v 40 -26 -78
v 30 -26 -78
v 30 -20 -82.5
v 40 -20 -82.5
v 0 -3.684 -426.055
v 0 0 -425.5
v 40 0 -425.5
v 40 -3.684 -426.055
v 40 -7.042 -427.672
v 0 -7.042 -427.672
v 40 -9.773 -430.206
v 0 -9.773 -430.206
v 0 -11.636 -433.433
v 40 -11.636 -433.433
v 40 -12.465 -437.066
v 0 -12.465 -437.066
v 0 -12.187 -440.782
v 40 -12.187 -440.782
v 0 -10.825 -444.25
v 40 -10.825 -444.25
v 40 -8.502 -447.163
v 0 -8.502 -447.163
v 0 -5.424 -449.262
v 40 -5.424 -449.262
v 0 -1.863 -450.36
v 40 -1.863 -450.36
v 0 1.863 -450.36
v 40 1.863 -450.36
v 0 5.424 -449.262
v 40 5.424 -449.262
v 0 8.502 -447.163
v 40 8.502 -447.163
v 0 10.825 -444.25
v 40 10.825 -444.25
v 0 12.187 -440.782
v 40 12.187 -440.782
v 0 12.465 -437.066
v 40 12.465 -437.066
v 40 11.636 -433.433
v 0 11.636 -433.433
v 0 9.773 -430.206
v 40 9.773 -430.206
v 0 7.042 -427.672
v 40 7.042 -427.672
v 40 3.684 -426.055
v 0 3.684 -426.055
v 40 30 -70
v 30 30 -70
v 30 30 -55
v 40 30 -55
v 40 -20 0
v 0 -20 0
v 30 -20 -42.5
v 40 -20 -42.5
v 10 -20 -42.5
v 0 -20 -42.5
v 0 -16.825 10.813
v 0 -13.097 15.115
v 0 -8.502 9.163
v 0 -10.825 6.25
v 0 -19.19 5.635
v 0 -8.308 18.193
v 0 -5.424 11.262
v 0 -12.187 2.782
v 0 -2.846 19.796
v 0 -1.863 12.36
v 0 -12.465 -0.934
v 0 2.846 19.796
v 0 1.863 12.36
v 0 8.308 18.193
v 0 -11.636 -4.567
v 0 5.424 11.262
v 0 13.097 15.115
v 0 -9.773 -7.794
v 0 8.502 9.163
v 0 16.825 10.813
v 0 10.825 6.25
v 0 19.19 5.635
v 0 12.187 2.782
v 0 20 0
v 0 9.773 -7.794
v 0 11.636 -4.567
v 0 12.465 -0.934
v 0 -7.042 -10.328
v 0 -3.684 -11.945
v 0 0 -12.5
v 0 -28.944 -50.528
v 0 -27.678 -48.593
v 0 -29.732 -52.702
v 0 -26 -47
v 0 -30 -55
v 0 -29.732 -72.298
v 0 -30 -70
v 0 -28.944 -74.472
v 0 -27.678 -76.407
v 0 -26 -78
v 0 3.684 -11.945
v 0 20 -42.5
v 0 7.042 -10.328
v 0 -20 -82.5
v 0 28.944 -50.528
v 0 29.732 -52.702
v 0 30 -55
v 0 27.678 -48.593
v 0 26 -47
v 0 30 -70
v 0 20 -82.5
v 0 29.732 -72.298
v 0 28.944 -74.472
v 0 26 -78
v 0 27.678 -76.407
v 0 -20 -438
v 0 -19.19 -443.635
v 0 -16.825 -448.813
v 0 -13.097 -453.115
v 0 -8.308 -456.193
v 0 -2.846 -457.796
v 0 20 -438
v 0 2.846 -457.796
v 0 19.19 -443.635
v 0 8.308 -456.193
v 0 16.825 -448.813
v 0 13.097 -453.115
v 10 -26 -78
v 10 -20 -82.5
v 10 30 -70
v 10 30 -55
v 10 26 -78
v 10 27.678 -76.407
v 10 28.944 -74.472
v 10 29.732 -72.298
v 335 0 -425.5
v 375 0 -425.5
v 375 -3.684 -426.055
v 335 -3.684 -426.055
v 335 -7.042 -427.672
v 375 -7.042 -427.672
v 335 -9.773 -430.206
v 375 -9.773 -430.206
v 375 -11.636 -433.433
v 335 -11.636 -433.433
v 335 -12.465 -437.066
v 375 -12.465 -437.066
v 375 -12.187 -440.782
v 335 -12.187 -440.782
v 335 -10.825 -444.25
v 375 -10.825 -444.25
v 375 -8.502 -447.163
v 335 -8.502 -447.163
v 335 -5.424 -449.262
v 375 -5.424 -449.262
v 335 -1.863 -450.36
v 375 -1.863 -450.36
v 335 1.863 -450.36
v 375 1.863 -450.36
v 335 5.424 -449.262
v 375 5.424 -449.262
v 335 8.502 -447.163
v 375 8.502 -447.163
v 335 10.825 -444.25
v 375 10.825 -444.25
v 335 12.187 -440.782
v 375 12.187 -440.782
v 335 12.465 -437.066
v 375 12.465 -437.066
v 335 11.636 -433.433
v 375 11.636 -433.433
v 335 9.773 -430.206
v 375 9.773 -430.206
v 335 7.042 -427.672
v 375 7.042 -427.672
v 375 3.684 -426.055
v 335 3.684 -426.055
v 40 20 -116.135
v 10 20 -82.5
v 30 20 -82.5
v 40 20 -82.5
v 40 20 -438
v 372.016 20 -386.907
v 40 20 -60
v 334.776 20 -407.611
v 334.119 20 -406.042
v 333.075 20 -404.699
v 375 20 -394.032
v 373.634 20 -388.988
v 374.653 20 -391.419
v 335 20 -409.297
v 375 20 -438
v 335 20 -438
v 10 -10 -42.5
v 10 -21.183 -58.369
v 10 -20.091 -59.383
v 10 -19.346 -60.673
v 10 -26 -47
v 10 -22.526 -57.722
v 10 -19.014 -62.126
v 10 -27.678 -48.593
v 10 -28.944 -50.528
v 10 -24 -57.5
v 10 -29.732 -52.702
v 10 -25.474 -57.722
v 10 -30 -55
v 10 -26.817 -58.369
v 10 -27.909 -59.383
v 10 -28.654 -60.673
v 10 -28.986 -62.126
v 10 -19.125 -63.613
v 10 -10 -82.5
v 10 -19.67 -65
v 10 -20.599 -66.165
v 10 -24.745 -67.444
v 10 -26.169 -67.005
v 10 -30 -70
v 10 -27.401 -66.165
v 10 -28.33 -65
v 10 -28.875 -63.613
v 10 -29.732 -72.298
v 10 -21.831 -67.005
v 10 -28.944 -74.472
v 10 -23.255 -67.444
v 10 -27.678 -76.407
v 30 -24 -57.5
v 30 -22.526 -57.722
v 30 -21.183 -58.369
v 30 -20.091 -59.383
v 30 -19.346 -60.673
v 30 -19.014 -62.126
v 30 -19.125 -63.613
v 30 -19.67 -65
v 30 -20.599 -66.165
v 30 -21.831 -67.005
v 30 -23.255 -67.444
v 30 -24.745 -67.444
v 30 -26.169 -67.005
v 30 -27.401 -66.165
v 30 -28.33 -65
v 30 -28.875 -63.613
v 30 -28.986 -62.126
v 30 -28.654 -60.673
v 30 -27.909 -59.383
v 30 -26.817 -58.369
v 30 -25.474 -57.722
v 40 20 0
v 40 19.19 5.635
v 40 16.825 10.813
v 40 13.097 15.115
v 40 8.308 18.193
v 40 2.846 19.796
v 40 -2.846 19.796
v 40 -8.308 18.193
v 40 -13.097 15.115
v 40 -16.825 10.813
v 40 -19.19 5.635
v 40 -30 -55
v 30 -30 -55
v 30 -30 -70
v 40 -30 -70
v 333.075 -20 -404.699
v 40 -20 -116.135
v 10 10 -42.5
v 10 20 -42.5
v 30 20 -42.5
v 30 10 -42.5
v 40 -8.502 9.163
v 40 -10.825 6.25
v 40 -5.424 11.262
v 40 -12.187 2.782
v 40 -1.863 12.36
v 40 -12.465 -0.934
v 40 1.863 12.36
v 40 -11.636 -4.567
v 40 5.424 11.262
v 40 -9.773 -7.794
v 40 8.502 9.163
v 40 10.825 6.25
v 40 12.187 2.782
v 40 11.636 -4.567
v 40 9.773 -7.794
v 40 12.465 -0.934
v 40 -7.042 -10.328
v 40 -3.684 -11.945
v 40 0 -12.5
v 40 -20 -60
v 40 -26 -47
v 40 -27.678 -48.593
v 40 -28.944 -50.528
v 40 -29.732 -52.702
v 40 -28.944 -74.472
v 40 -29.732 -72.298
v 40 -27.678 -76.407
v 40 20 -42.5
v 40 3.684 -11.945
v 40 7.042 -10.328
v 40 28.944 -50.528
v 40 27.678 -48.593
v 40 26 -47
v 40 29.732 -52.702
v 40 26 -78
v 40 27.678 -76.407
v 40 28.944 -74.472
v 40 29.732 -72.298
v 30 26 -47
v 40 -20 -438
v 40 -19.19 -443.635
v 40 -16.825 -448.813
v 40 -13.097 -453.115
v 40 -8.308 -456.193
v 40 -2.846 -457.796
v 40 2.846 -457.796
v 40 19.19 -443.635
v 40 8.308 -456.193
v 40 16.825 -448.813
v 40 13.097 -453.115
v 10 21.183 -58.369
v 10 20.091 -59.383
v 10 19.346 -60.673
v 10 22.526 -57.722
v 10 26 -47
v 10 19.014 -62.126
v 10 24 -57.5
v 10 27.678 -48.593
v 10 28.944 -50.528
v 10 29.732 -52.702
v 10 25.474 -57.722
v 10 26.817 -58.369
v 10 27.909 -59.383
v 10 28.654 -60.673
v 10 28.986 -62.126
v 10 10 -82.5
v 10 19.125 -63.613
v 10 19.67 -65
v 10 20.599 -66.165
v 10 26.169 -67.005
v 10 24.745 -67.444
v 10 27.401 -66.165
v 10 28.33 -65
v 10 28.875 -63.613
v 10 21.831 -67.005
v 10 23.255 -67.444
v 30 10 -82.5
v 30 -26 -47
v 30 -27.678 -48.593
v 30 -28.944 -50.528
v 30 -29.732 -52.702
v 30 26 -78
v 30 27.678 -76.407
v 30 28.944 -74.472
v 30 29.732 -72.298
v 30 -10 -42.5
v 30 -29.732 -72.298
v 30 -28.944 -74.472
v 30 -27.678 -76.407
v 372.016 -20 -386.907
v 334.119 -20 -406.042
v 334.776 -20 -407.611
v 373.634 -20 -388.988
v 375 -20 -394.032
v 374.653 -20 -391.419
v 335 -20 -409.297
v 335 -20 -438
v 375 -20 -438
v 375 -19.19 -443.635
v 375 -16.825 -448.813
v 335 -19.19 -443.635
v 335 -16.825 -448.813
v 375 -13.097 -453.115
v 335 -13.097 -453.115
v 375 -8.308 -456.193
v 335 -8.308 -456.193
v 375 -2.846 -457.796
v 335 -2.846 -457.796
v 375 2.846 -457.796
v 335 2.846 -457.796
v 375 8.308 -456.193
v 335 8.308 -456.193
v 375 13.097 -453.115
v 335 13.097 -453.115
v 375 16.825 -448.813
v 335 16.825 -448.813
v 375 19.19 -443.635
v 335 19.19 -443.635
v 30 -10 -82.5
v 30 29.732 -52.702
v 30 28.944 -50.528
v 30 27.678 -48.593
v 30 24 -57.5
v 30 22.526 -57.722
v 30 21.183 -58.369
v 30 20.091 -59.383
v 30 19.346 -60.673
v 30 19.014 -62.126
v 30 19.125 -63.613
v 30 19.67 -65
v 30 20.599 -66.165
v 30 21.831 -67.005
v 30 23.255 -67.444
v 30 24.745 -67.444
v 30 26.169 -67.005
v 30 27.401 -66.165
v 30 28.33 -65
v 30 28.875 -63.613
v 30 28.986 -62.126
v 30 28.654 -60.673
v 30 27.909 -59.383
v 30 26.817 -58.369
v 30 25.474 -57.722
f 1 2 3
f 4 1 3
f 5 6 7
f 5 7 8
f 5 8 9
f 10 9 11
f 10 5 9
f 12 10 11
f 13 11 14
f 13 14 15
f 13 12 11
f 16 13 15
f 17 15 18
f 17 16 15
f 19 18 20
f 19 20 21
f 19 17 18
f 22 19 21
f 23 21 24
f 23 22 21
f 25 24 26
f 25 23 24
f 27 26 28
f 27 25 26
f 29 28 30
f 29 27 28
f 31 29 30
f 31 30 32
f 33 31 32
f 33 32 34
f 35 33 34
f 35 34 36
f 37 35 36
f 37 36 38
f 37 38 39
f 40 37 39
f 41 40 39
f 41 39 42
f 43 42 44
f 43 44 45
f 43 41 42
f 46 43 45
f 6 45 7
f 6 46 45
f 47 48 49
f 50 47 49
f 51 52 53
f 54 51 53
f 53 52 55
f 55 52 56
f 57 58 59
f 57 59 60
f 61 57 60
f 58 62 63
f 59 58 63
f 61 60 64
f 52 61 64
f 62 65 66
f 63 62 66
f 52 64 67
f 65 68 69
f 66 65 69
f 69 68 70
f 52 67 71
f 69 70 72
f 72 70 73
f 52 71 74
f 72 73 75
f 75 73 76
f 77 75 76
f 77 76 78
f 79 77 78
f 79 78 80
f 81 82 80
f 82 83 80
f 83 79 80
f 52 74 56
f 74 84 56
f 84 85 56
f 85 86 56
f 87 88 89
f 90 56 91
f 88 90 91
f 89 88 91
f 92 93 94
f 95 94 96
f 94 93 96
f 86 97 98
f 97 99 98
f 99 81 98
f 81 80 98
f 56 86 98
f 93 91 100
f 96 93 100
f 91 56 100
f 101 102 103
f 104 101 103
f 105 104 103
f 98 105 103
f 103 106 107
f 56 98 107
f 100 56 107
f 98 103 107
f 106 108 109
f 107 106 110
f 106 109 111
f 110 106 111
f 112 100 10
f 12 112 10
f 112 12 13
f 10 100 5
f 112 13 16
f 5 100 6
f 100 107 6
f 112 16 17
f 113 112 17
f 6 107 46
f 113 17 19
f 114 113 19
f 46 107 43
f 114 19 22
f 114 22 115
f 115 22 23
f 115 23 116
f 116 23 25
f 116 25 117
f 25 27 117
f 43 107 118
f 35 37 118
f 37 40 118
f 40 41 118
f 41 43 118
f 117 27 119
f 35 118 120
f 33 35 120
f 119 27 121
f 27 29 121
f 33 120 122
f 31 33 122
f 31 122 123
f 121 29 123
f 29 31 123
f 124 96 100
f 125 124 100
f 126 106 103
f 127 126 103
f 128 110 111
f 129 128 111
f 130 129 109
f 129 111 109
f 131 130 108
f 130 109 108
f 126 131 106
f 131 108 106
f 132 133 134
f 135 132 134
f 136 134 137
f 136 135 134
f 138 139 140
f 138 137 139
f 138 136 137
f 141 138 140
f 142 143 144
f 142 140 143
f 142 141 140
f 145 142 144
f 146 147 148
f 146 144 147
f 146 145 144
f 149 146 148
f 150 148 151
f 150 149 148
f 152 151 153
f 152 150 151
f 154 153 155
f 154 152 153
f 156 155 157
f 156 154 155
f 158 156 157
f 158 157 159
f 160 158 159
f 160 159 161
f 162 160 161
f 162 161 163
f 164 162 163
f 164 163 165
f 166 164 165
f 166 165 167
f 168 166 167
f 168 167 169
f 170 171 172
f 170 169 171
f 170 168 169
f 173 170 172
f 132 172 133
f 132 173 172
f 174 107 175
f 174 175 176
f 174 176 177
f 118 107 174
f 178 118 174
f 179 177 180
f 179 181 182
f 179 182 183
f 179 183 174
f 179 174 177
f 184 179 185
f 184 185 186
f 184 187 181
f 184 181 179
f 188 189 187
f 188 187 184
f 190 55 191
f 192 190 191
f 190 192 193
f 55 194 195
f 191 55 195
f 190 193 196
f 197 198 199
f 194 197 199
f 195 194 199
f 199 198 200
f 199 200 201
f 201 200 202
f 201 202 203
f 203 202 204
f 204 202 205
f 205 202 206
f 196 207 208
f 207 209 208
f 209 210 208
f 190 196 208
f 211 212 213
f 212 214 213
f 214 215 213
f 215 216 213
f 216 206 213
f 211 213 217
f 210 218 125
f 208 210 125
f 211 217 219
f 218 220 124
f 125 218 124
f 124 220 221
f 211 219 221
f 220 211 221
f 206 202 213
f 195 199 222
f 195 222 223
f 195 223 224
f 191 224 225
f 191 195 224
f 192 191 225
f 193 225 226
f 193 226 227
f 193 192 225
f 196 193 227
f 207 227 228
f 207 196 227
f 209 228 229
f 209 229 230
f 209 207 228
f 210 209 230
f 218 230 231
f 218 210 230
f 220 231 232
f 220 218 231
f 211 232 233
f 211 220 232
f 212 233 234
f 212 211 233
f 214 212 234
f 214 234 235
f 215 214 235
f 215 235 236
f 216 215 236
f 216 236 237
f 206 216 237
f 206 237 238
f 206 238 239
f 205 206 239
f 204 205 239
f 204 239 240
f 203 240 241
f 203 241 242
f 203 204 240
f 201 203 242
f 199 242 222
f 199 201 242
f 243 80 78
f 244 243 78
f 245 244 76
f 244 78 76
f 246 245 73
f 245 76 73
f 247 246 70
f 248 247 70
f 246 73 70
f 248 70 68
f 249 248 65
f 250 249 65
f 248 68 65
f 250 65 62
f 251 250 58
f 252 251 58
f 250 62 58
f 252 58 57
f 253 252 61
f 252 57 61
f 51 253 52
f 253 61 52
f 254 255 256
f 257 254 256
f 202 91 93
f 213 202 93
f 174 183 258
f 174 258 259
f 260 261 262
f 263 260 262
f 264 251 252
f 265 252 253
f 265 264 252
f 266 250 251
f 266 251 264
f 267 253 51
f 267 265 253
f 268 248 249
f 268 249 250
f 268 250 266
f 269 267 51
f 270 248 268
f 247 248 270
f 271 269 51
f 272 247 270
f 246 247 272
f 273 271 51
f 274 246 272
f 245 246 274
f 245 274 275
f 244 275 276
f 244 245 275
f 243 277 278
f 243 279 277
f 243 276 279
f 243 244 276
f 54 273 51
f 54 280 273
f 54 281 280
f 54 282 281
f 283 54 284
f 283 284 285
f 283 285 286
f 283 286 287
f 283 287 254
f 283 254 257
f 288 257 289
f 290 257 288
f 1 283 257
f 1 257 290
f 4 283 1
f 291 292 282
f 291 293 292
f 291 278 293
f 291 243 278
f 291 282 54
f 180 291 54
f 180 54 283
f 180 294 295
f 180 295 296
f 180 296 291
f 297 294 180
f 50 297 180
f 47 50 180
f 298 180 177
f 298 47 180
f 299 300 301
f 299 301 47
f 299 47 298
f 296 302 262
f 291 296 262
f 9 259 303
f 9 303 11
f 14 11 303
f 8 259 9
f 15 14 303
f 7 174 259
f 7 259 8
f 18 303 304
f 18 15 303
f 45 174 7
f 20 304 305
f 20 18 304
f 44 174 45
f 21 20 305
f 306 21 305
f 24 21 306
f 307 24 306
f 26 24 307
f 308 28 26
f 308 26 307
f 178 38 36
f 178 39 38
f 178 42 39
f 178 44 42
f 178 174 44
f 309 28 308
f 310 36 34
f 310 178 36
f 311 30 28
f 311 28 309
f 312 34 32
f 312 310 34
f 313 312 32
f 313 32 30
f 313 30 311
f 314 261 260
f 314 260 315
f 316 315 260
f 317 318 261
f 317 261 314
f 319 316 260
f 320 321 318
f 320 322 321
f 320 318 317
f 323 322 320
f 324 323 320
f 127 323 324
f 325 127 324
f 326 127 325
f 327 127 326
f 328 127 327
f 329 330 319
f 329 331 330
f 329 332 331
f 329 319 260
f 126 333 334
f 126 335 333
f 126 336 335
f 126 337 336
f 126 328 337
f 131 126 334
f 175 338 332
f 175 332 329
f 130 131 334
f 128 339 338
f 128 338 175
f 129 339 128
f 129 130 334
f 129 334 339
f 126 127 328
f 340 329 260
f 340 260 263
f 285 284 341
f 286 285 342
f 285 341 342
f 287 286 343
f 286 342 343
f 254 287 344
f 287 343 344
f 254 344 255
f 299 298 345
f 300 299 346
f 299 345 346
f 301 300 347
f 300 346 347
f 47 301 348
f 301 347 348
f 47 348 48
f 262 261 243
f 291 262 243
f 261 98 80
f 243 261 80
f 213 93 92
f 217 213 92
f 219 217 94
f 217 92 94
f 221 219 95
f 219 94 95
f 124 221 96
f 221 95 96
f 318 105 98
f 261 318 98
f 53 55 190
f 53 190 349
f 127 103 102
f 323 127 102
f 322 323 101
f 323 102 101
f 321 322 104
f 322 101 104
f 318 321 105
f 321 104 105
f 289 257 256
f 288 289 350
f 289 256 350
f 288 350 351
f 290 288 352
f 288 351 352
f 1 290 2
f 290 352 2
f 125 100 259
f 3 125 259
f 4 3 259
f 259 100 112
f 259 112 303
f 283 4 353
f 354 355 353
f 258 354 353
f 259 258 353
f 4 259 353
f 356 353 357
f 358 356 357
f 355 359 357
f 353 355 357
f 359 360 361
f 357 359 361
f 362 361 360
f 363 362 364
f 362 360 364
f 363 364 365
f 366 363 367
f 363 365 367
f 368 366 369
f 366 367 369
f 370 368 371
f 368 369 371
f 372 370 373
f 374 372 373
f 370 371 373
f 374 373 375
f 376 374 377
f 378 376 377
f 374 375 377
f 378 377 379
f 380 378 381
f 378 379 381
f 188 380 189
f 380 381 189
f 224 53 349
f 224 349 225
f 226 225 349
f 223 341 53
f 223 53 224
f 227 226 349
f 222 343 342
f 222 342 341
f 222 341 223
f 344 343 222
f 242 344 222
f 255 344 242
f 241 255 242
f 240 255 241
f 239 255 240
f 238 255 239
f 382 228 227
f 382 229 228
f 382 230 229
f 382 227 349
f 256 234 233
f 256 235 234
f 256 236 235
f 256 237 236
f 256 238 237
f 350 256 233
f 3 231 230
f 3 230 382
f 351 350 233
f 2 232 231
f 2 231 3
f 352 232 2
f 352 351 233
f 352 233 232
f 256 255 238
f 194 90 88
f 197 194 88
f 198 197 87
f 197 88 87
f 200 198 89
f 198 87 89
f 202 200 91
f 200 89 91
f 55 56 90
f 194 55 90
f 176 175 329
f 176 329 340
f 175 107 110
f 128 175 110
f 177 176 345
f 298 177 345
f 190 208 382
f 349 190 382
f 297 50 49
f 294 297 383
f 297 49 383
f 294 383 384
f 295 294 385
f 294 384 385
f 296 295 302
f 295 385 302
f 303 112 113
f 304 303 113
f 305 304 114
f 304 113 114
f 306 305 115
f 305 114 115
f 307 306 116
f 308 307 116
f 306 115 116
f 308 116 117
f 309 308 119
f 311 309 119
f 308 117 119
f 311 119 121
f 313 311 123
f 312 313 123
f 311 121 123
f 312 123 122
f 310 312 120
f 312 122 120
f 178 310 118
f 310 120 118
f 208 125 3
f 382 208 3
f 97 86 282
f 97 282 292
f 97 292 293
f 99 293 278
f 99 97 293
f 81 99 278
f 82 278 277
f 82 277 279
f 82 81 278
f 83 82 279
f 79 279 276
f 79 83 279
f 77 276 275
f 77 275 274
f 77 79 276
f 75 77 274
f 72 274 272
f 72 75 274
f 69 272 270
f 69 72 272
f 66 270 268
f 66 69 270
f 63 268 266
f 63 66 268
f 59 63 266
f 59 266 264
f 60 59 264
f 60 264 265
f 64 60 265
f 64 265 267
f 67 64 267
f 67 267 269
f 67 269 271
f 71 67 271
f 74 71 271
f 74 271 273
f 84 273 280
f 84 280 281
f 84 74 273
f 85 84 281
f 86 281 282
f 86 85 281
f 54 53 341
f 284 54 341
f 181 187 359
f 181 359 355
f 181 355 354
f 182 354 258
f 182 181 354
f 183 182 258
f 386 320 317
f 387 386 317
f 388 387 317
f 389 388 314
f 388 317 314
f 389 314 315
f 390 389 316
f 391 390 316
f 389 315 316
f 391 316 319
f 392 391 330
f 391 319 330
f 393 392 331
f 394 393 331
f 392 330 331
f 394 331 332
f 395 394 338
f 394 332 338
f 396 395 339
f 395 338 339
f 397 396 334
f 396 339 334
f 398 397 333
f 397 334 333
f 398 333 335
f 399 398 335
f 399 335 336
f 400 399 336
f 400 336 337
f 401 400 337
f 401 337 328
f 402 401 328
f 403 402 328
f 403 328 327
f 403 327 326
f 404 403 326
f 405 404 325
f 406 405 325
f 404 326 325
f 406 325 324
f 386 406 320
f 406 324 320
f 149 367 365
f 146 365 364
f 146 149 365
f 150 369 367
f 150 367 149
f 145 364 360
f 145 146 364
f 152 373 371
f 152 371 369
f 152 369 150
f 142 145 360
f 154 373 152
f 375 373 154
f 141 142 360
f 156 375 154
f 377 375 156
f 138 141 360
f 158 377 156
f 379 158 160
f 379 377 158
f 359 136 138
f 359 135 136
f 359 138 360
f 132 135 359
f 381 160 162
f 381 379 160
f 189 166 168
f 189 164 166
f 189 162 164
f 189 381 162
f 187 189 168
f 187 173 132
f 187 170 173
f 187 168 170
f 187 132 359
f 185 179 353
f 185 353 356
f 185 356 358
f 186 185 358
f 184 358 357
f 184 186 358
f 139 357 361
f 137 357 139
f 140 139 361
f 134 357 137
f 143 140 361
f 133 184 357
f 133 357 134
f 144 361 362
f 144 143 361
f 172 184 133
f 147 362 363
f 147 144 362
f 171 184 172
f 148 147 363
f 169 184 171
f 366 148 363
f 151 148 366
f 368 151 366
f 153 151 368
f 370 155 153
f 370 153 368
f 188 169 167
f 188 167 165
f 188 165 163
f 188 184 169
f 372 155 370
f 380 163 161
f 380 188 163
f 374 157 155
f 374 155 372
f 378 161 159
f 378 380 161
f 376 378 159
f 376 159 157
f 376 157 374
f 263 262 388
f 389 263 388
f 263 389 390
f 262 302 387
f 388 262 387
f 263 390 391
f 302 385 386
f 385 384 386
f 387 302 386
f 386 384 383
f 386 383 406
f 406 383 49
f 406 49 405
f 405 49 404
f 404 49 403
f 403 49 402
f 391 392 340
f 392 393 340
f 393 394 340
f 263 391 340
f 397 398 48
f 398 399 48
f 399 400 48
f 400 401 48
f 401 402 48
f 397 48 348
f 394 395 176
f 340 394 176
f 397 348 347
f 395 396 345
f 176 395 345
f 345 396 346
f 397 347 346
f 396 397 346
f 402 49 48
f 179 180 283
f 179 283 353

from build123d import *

# Parameters (mm, degrees)
CROQUIS1_R                 = 12.5
SALIENTE_EXTRUIR1_DEPTH    = 40
SALIENTE_EXTRUIR2_DEPTH    = 40
CORTAR_EXTRUIR2_DEPTH      = 45
CORTAR_EXTRUIR2_DEPTH_BACK = 45
CROQUIS4_R                 = 12.5
CROQUIS6_W                 = 20
CROQUIS6_H                 = 40
CORTAR_EXTRUIR3_DEPTH      = 20
CROQUIS7_R                 = 5
SALIENTE_EXTRUIR3_DEPTH    = 20


with BuildPart() as part:
    # Croquis1 → Saliente-Extruir1 (new body)
    with BuildSketch(Plane(origin=(0, 0, 0), x_dir=(0, 0, -1), z_dir=(1, 0, 0))):
        with BuildLine():
            Line((42.5, 20), (0, 20))
            ThreePointArc((0, 20), (-20, 0), (0, -20))
            Line((0, -20), (42.5, -20))
            Line((42.5, -20), (47, -26))
            ThreePointArc((47, -26), (50.527864045, -28.94427191), (55, -30))
            Line((55, -30), (70, -30))
            ThreePointArc((70, -30), (74.472135955, -28.94427191), (78, -26))
            Line((78, -26), (82.5, -20))
            Line((82.5, -20), (438, -20))
            ThreePointArc((438, -20), (458, 0), (438, 20))
            Line((438, 20), (82.5, 20))
            Line((82.5, 20), (78, 26))
            ThreePointArc((78, 26), (74.472135955, 28.94427191), (70, 30))
            Line((70, 30), (55, 30))
            ThreePointArc((55, 30), (50.527864045, 28.94427191), (47, 26))
            Line((47, 26), (42.5, 20))
        make_face()
        with Locations((438, 0)):
            Circle(CROQUIS1_R, mode=Mode.SUBTRACT)
        Circle(CROQUIS1_R, mode=Mode.SUBTRACT)
    extrude(amount=SALIENTE_EXTRUIR1_DEPTH)

    # Croquis2 → Saliente-Extruir2 (add)
    with BuildSketch(Plane(origin=(0, 20, 0), x_dir=(1, 0, 0), z_dir=(0, 1, 0))):
        with BuildLine():
            Line((40, 116.134954918), (40, 60))
            Line((40, 60), (372.016025575, 386.906530798))
            ThreePointArc((372.016025575, 386.906530798), (374.223888978, 390.169590656), (375, 394.032215687))
            Line((375, 394.032215687), (375, 458))
            Line((375, 458), (335, 458))
            Line((335, 458), (335, 438.09469359))
            Line((335, 438.09469359), (335, 409.297101222))
            ThreePointArc((335, 409.297101222), (334.49922902, 406.80481537), (333.074646857, 404.699387623))
            Line((333.074646857, 404.699387623), (40, 116.134954918))
        make_face()
    extrude(amount=-SALIENTE_EXTRUIR2_DEPTH)

    # Croquis4 → Cortar-Extruir2 (cut, two sides: drawn at the far end of the back side and taken through both)
    with BuildSketch(Plane(origin=(375, 0, 0), x_dir=(0, 0, -1), z_dir=(1, 0, 0)).offset(-CORTAR_EXTRUIR2_DEPTH_BACK)):
        with Locations((438, 0)):
            Circle(CROQUIS4_R)
        with BuildLine():
            Line((438, 20), (458, 20))
            Line((458, 20), (498.77405459, 20))
            Line((498.77405459, 20), (498.77405459, -20))
            Line((498.77405459, -20), (438, -20))
            ThreePointArc((438, -20), (458, 0), (438, 20))
        make_face()
    extrude(amount=CORTAR_EXTRUIR2_DEPTH + CORTAR_EXTRUIR2_DEPTH_BACK, mode=Mode.SUBTRACT)

    # Croquis6 → Cortar-Extruir3 (cut)
    with BuildSketch(Plane(origin=(0, 30, 0), x_dir=(1, 0, 0), z_dir=(0, 1, 0))):
        with Locations((20, 62.5)):
            Rectangle(CROQUIS6_W, CROQUIS6_H)
    cortar_extruir3 = extrude(amount=-CORTAR_EXTRUIR3_DEPTH, mode=Mode.SUBTRACT)

    # Croquis7 → Saliente-Extruir3 (add)
    with BuildSketch(Plane(origin=(10, 0, 0), x_dir=(0, 0, -1), z_dir=(1, 0, 0))):
        with Locations((62.5, 24)):
            Circle(CROQUIS7_R)
    saliente_extruir3 = extrude(amount=SALIENTE_EXTRUIR3_DEPTH)

    # Simetría1: Cortar-Extruir3, Saliente-Extruir3 across plane
    add(cortar_extruir3.mirror(Plane.ZX), mode=Mode.SUBTRACT)
    add(saliente_extruir3.mirror(Plane.ZX))


solid = part.part
